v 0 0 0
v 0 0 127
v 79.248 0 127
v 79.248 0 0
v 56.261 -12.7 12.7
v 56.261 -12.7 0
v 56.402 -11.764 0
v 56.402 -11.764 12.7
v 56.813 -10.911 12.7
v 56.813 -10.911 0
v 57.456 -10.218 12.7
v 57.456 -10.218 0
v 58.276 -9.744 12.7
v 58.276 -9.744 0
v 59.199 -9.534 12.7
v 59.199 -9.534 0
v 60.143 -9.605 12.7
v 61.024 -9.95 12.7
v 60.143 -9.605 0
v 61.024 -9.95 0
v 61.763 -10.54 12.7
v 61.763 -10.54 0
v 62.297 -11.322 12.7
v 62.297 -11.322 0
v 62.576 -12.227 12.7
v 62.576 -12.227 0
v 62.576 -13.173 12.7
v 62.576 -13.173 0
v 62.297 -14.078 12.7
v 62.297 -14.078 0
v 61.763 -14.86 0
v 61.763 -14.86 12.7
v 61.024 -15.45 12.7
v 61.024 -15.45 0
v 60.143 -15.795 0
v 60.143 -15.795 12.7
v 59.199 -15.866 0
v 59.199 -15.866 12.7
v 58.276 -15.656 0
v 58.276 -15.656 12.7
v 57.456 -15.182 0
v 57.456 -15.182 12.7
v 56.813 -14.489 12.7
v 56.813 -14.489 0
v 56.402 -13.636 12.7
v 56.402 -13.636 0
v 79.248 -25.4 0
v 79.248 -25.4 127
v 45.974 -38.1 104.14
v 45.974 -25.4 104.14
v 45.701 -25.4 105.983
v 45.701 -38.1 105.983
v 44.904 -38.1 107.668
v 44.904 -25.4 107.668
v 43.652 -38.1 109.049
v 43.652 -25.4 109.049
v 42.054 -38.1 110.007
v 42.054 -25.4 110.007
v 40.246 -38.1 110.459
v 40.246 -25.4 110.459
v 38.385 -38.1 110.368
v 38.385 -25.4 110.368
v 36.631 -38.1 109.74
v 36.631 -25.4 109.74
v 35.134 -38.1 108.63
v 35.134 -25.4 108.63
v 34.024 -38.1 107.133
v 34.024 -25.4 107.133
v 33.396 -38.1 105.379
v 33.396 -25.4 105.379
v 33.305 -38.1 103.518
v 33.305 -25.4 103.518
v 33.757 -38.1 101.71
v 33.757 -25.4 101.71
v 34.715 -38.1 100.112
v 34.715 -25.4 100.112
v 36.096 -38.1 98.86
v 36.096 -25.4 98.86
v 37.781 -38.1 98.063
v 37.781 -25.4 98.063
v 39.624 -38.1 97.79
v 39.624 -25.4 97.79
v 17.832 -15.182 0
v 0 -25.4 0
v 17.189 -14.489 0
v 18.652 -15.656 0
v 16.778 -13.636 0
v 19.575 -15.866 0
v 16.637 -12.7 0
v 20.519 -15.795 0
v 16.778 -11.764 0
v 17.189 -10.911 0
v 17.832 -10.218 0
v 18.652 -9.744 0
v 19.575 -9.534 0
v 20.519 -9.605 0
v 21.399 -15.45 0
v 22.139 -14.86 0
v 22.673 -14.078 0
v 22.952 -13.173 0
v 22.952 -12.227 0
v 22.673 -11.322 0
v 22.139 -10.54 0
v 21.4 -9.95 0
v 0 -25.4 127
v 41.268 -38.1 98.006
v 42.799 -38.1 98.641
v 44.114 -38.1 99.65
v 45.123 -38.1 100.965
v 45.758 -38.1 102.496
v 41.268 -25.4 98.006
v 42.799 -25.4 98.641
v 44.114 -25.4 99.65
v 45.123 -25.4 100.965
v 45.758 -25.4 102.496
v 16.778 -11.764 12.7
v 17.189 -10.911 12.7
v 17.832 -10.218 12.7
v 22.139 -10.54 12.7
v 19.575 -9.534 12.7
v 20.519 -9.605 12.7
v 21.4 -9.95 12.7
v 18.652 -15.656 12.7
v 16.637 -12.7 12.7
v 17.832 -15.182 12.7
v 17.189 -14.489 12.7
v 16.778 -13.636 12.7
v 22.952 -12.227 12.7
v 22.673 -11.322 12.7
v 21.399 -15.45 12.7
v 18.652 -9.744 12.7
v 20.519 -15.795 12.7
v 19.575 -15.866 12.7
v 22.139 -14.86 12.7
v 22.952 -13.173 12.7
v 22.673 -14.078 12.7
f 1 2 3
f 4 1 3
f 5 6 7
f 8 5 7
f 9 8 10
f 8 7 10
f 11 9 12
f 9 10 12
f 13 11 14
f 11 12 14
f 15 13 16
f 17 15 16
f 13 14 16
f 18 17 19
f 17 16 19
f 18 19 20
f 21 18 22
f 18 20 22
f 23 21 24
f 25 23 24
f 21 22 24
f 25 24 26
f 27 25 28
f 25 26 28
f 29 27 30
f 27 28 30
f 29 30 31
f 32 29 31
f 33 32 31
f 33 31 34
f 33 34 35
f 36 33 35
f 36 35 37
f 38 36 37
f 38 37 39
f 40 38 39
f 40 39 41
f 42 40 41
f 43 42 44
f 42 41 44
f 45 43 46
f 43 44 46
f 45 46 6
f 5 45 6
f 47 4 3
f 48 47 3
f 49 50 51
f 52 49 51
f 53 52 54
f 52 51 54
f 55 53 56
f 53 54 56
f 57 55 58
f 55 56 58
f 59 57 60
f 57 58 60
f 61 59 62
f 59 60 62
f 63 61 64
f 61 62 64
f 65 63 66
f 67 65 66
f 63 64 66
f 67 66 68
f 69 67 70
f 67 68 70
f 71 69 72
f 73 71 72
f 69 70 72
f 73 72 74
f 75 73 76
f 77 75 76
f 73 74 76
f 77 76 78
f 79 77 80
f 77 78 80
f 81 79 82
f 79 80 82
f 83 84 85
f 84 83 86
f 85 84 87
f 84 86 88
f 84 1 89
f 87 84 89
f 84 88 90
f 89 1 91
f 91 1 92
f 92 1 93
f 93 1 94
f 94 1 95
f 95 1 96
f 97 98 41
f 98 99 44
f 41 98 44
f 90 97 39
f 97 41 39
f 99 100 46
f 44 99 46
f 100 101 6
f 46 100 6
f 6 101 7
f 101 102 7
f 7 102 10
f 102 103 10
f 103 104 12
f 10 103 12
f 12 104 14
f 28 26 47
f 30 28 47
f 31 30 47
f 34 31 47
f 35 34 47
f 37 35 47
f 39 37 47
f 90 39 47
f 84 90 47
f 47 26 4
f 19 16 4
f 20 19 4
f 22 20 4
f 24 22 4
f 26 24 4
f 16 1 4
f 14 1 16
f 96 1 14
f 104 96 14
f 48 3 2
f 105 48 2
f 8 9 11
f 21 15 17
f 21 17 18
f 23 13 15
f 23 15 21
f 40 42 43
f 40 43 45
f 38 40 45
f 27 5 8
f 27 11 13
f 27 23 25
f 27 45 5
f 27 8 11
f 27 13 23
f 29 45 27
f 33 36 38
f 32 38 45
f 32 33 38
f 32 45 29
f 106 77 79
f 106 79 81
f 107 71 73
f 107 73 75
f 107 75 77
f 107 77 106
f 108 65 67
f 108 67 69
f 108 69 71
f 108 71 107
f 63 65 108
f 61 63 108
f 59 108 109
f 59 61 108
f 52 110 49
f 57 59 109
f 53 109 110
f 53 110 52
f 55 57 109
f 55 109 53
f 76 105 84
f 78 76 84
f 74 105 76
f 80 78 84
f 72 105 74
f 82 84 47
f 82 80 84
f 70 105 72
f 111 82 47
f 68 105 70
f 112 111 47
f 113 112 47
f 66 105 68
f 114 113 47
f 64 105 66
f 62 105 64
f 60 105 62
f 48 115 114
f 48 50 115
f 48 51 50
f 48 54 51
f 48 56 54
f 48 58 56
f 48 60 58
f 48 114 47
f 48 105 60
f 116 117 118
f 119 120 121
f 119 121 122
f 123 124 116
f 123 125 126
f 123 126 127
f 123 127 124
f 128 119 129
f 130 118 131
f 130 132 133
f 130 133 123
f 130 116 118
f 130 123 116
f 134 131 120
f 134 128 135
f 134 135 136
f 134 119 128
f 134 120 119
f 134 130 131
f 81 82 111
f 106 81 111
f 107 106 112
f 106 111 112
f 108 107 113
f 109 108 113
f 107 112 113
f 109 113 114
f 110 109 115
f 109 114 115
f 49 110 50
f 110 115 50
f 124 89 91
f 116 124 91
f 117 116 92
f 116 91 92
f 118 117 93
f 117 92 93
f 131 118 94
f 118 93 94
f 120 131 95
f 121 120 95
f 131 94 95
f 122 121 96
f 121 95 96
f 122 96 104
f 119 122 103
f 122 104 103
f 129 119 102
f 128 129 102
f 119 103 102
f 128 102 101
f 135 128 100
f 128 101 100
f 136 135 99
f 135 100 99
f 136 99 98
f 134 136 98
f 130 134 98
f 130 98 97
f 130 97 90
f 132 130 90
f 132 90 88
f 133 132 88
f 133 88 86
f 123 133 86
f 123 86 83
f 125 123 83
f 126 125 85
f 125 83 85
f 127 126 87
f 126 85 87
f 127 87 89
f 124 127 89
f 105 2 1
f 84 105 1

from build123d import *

# Parameters (mm, degrees)
F1_DEPTH = 25.4
F3_DEPTH = 12.7
F5_DEPTH = 12.7


with BuildPart() as f1:
    # F0 (on Front) → F1 (new body)
    with BuildSketch(Plane.XZ):
        Polygon((69.85, 127), (19.05, 127), (0, 127), (0, 0), (39.624, 0), (44.45, 0), (79.248, 0), (79.248, 127), align=None)
    extrude(amount=F1_DEPTH)

    # F2 (on face) → F3 (join)
    with BuildSketch(Plane.XZ.offset(25.4)):
        with BuildLine():
            ThreePointArc((39.624, 97.79), (44.114128, 99.649872), (45.974, 104.14))
            ThreePointArc((45.974, 104.14), (35.133872, 108.630128), (39.624, 97.79))
        make_face()
    extrude(amount=F3_DEPTH)

    # F4 (on face) → F5 (cut)
    with BuildSketch(Plane(origin=(0, 0, 0), x_dir=(1, 0, 0), z_dir=(0, 0, -1))):
        with BuildLine():
            Line((16.637, 12.7), (19.812, 12.7))
            Line((19.812, 12.7), (22.987, 12.7))
            ThreePointArc((22.987, 12.7), (19.812, 15.875), (16.637, 12.7))
        make_face()
        with BuildLine():
            Line((22.987, 12.7), (19.812, 12.7))
            Line((19.812, 12.7), (16.637, 12.7))
            ThreePointArc((16.637, 12.7), (19.812, 9.525), (22.987, 12.7))
        make_face()
        with BuildLine():
            ThreePointArc((62.611, 12.7), (59.436, 15.875), (56.261, 12.7))
            Line((56.261, 12.7), (59.436, 12.7))
            Line((59.436, 12.7), (62.611, 12.7))
        make_face()
        with BuildLine():
            Line((59.436, 12.7), (56.261, 12.7))
            ThreePointArc((56.261, 12.7), (59.436, 9.525), (62.611, 12.7))
            Line((62.611, 12.7), (59.436, 12.7))
        make_face()
    extrude(amount=-F5_DEPTH, mode=Mode.SUBTRACT)


solid = f1.part
